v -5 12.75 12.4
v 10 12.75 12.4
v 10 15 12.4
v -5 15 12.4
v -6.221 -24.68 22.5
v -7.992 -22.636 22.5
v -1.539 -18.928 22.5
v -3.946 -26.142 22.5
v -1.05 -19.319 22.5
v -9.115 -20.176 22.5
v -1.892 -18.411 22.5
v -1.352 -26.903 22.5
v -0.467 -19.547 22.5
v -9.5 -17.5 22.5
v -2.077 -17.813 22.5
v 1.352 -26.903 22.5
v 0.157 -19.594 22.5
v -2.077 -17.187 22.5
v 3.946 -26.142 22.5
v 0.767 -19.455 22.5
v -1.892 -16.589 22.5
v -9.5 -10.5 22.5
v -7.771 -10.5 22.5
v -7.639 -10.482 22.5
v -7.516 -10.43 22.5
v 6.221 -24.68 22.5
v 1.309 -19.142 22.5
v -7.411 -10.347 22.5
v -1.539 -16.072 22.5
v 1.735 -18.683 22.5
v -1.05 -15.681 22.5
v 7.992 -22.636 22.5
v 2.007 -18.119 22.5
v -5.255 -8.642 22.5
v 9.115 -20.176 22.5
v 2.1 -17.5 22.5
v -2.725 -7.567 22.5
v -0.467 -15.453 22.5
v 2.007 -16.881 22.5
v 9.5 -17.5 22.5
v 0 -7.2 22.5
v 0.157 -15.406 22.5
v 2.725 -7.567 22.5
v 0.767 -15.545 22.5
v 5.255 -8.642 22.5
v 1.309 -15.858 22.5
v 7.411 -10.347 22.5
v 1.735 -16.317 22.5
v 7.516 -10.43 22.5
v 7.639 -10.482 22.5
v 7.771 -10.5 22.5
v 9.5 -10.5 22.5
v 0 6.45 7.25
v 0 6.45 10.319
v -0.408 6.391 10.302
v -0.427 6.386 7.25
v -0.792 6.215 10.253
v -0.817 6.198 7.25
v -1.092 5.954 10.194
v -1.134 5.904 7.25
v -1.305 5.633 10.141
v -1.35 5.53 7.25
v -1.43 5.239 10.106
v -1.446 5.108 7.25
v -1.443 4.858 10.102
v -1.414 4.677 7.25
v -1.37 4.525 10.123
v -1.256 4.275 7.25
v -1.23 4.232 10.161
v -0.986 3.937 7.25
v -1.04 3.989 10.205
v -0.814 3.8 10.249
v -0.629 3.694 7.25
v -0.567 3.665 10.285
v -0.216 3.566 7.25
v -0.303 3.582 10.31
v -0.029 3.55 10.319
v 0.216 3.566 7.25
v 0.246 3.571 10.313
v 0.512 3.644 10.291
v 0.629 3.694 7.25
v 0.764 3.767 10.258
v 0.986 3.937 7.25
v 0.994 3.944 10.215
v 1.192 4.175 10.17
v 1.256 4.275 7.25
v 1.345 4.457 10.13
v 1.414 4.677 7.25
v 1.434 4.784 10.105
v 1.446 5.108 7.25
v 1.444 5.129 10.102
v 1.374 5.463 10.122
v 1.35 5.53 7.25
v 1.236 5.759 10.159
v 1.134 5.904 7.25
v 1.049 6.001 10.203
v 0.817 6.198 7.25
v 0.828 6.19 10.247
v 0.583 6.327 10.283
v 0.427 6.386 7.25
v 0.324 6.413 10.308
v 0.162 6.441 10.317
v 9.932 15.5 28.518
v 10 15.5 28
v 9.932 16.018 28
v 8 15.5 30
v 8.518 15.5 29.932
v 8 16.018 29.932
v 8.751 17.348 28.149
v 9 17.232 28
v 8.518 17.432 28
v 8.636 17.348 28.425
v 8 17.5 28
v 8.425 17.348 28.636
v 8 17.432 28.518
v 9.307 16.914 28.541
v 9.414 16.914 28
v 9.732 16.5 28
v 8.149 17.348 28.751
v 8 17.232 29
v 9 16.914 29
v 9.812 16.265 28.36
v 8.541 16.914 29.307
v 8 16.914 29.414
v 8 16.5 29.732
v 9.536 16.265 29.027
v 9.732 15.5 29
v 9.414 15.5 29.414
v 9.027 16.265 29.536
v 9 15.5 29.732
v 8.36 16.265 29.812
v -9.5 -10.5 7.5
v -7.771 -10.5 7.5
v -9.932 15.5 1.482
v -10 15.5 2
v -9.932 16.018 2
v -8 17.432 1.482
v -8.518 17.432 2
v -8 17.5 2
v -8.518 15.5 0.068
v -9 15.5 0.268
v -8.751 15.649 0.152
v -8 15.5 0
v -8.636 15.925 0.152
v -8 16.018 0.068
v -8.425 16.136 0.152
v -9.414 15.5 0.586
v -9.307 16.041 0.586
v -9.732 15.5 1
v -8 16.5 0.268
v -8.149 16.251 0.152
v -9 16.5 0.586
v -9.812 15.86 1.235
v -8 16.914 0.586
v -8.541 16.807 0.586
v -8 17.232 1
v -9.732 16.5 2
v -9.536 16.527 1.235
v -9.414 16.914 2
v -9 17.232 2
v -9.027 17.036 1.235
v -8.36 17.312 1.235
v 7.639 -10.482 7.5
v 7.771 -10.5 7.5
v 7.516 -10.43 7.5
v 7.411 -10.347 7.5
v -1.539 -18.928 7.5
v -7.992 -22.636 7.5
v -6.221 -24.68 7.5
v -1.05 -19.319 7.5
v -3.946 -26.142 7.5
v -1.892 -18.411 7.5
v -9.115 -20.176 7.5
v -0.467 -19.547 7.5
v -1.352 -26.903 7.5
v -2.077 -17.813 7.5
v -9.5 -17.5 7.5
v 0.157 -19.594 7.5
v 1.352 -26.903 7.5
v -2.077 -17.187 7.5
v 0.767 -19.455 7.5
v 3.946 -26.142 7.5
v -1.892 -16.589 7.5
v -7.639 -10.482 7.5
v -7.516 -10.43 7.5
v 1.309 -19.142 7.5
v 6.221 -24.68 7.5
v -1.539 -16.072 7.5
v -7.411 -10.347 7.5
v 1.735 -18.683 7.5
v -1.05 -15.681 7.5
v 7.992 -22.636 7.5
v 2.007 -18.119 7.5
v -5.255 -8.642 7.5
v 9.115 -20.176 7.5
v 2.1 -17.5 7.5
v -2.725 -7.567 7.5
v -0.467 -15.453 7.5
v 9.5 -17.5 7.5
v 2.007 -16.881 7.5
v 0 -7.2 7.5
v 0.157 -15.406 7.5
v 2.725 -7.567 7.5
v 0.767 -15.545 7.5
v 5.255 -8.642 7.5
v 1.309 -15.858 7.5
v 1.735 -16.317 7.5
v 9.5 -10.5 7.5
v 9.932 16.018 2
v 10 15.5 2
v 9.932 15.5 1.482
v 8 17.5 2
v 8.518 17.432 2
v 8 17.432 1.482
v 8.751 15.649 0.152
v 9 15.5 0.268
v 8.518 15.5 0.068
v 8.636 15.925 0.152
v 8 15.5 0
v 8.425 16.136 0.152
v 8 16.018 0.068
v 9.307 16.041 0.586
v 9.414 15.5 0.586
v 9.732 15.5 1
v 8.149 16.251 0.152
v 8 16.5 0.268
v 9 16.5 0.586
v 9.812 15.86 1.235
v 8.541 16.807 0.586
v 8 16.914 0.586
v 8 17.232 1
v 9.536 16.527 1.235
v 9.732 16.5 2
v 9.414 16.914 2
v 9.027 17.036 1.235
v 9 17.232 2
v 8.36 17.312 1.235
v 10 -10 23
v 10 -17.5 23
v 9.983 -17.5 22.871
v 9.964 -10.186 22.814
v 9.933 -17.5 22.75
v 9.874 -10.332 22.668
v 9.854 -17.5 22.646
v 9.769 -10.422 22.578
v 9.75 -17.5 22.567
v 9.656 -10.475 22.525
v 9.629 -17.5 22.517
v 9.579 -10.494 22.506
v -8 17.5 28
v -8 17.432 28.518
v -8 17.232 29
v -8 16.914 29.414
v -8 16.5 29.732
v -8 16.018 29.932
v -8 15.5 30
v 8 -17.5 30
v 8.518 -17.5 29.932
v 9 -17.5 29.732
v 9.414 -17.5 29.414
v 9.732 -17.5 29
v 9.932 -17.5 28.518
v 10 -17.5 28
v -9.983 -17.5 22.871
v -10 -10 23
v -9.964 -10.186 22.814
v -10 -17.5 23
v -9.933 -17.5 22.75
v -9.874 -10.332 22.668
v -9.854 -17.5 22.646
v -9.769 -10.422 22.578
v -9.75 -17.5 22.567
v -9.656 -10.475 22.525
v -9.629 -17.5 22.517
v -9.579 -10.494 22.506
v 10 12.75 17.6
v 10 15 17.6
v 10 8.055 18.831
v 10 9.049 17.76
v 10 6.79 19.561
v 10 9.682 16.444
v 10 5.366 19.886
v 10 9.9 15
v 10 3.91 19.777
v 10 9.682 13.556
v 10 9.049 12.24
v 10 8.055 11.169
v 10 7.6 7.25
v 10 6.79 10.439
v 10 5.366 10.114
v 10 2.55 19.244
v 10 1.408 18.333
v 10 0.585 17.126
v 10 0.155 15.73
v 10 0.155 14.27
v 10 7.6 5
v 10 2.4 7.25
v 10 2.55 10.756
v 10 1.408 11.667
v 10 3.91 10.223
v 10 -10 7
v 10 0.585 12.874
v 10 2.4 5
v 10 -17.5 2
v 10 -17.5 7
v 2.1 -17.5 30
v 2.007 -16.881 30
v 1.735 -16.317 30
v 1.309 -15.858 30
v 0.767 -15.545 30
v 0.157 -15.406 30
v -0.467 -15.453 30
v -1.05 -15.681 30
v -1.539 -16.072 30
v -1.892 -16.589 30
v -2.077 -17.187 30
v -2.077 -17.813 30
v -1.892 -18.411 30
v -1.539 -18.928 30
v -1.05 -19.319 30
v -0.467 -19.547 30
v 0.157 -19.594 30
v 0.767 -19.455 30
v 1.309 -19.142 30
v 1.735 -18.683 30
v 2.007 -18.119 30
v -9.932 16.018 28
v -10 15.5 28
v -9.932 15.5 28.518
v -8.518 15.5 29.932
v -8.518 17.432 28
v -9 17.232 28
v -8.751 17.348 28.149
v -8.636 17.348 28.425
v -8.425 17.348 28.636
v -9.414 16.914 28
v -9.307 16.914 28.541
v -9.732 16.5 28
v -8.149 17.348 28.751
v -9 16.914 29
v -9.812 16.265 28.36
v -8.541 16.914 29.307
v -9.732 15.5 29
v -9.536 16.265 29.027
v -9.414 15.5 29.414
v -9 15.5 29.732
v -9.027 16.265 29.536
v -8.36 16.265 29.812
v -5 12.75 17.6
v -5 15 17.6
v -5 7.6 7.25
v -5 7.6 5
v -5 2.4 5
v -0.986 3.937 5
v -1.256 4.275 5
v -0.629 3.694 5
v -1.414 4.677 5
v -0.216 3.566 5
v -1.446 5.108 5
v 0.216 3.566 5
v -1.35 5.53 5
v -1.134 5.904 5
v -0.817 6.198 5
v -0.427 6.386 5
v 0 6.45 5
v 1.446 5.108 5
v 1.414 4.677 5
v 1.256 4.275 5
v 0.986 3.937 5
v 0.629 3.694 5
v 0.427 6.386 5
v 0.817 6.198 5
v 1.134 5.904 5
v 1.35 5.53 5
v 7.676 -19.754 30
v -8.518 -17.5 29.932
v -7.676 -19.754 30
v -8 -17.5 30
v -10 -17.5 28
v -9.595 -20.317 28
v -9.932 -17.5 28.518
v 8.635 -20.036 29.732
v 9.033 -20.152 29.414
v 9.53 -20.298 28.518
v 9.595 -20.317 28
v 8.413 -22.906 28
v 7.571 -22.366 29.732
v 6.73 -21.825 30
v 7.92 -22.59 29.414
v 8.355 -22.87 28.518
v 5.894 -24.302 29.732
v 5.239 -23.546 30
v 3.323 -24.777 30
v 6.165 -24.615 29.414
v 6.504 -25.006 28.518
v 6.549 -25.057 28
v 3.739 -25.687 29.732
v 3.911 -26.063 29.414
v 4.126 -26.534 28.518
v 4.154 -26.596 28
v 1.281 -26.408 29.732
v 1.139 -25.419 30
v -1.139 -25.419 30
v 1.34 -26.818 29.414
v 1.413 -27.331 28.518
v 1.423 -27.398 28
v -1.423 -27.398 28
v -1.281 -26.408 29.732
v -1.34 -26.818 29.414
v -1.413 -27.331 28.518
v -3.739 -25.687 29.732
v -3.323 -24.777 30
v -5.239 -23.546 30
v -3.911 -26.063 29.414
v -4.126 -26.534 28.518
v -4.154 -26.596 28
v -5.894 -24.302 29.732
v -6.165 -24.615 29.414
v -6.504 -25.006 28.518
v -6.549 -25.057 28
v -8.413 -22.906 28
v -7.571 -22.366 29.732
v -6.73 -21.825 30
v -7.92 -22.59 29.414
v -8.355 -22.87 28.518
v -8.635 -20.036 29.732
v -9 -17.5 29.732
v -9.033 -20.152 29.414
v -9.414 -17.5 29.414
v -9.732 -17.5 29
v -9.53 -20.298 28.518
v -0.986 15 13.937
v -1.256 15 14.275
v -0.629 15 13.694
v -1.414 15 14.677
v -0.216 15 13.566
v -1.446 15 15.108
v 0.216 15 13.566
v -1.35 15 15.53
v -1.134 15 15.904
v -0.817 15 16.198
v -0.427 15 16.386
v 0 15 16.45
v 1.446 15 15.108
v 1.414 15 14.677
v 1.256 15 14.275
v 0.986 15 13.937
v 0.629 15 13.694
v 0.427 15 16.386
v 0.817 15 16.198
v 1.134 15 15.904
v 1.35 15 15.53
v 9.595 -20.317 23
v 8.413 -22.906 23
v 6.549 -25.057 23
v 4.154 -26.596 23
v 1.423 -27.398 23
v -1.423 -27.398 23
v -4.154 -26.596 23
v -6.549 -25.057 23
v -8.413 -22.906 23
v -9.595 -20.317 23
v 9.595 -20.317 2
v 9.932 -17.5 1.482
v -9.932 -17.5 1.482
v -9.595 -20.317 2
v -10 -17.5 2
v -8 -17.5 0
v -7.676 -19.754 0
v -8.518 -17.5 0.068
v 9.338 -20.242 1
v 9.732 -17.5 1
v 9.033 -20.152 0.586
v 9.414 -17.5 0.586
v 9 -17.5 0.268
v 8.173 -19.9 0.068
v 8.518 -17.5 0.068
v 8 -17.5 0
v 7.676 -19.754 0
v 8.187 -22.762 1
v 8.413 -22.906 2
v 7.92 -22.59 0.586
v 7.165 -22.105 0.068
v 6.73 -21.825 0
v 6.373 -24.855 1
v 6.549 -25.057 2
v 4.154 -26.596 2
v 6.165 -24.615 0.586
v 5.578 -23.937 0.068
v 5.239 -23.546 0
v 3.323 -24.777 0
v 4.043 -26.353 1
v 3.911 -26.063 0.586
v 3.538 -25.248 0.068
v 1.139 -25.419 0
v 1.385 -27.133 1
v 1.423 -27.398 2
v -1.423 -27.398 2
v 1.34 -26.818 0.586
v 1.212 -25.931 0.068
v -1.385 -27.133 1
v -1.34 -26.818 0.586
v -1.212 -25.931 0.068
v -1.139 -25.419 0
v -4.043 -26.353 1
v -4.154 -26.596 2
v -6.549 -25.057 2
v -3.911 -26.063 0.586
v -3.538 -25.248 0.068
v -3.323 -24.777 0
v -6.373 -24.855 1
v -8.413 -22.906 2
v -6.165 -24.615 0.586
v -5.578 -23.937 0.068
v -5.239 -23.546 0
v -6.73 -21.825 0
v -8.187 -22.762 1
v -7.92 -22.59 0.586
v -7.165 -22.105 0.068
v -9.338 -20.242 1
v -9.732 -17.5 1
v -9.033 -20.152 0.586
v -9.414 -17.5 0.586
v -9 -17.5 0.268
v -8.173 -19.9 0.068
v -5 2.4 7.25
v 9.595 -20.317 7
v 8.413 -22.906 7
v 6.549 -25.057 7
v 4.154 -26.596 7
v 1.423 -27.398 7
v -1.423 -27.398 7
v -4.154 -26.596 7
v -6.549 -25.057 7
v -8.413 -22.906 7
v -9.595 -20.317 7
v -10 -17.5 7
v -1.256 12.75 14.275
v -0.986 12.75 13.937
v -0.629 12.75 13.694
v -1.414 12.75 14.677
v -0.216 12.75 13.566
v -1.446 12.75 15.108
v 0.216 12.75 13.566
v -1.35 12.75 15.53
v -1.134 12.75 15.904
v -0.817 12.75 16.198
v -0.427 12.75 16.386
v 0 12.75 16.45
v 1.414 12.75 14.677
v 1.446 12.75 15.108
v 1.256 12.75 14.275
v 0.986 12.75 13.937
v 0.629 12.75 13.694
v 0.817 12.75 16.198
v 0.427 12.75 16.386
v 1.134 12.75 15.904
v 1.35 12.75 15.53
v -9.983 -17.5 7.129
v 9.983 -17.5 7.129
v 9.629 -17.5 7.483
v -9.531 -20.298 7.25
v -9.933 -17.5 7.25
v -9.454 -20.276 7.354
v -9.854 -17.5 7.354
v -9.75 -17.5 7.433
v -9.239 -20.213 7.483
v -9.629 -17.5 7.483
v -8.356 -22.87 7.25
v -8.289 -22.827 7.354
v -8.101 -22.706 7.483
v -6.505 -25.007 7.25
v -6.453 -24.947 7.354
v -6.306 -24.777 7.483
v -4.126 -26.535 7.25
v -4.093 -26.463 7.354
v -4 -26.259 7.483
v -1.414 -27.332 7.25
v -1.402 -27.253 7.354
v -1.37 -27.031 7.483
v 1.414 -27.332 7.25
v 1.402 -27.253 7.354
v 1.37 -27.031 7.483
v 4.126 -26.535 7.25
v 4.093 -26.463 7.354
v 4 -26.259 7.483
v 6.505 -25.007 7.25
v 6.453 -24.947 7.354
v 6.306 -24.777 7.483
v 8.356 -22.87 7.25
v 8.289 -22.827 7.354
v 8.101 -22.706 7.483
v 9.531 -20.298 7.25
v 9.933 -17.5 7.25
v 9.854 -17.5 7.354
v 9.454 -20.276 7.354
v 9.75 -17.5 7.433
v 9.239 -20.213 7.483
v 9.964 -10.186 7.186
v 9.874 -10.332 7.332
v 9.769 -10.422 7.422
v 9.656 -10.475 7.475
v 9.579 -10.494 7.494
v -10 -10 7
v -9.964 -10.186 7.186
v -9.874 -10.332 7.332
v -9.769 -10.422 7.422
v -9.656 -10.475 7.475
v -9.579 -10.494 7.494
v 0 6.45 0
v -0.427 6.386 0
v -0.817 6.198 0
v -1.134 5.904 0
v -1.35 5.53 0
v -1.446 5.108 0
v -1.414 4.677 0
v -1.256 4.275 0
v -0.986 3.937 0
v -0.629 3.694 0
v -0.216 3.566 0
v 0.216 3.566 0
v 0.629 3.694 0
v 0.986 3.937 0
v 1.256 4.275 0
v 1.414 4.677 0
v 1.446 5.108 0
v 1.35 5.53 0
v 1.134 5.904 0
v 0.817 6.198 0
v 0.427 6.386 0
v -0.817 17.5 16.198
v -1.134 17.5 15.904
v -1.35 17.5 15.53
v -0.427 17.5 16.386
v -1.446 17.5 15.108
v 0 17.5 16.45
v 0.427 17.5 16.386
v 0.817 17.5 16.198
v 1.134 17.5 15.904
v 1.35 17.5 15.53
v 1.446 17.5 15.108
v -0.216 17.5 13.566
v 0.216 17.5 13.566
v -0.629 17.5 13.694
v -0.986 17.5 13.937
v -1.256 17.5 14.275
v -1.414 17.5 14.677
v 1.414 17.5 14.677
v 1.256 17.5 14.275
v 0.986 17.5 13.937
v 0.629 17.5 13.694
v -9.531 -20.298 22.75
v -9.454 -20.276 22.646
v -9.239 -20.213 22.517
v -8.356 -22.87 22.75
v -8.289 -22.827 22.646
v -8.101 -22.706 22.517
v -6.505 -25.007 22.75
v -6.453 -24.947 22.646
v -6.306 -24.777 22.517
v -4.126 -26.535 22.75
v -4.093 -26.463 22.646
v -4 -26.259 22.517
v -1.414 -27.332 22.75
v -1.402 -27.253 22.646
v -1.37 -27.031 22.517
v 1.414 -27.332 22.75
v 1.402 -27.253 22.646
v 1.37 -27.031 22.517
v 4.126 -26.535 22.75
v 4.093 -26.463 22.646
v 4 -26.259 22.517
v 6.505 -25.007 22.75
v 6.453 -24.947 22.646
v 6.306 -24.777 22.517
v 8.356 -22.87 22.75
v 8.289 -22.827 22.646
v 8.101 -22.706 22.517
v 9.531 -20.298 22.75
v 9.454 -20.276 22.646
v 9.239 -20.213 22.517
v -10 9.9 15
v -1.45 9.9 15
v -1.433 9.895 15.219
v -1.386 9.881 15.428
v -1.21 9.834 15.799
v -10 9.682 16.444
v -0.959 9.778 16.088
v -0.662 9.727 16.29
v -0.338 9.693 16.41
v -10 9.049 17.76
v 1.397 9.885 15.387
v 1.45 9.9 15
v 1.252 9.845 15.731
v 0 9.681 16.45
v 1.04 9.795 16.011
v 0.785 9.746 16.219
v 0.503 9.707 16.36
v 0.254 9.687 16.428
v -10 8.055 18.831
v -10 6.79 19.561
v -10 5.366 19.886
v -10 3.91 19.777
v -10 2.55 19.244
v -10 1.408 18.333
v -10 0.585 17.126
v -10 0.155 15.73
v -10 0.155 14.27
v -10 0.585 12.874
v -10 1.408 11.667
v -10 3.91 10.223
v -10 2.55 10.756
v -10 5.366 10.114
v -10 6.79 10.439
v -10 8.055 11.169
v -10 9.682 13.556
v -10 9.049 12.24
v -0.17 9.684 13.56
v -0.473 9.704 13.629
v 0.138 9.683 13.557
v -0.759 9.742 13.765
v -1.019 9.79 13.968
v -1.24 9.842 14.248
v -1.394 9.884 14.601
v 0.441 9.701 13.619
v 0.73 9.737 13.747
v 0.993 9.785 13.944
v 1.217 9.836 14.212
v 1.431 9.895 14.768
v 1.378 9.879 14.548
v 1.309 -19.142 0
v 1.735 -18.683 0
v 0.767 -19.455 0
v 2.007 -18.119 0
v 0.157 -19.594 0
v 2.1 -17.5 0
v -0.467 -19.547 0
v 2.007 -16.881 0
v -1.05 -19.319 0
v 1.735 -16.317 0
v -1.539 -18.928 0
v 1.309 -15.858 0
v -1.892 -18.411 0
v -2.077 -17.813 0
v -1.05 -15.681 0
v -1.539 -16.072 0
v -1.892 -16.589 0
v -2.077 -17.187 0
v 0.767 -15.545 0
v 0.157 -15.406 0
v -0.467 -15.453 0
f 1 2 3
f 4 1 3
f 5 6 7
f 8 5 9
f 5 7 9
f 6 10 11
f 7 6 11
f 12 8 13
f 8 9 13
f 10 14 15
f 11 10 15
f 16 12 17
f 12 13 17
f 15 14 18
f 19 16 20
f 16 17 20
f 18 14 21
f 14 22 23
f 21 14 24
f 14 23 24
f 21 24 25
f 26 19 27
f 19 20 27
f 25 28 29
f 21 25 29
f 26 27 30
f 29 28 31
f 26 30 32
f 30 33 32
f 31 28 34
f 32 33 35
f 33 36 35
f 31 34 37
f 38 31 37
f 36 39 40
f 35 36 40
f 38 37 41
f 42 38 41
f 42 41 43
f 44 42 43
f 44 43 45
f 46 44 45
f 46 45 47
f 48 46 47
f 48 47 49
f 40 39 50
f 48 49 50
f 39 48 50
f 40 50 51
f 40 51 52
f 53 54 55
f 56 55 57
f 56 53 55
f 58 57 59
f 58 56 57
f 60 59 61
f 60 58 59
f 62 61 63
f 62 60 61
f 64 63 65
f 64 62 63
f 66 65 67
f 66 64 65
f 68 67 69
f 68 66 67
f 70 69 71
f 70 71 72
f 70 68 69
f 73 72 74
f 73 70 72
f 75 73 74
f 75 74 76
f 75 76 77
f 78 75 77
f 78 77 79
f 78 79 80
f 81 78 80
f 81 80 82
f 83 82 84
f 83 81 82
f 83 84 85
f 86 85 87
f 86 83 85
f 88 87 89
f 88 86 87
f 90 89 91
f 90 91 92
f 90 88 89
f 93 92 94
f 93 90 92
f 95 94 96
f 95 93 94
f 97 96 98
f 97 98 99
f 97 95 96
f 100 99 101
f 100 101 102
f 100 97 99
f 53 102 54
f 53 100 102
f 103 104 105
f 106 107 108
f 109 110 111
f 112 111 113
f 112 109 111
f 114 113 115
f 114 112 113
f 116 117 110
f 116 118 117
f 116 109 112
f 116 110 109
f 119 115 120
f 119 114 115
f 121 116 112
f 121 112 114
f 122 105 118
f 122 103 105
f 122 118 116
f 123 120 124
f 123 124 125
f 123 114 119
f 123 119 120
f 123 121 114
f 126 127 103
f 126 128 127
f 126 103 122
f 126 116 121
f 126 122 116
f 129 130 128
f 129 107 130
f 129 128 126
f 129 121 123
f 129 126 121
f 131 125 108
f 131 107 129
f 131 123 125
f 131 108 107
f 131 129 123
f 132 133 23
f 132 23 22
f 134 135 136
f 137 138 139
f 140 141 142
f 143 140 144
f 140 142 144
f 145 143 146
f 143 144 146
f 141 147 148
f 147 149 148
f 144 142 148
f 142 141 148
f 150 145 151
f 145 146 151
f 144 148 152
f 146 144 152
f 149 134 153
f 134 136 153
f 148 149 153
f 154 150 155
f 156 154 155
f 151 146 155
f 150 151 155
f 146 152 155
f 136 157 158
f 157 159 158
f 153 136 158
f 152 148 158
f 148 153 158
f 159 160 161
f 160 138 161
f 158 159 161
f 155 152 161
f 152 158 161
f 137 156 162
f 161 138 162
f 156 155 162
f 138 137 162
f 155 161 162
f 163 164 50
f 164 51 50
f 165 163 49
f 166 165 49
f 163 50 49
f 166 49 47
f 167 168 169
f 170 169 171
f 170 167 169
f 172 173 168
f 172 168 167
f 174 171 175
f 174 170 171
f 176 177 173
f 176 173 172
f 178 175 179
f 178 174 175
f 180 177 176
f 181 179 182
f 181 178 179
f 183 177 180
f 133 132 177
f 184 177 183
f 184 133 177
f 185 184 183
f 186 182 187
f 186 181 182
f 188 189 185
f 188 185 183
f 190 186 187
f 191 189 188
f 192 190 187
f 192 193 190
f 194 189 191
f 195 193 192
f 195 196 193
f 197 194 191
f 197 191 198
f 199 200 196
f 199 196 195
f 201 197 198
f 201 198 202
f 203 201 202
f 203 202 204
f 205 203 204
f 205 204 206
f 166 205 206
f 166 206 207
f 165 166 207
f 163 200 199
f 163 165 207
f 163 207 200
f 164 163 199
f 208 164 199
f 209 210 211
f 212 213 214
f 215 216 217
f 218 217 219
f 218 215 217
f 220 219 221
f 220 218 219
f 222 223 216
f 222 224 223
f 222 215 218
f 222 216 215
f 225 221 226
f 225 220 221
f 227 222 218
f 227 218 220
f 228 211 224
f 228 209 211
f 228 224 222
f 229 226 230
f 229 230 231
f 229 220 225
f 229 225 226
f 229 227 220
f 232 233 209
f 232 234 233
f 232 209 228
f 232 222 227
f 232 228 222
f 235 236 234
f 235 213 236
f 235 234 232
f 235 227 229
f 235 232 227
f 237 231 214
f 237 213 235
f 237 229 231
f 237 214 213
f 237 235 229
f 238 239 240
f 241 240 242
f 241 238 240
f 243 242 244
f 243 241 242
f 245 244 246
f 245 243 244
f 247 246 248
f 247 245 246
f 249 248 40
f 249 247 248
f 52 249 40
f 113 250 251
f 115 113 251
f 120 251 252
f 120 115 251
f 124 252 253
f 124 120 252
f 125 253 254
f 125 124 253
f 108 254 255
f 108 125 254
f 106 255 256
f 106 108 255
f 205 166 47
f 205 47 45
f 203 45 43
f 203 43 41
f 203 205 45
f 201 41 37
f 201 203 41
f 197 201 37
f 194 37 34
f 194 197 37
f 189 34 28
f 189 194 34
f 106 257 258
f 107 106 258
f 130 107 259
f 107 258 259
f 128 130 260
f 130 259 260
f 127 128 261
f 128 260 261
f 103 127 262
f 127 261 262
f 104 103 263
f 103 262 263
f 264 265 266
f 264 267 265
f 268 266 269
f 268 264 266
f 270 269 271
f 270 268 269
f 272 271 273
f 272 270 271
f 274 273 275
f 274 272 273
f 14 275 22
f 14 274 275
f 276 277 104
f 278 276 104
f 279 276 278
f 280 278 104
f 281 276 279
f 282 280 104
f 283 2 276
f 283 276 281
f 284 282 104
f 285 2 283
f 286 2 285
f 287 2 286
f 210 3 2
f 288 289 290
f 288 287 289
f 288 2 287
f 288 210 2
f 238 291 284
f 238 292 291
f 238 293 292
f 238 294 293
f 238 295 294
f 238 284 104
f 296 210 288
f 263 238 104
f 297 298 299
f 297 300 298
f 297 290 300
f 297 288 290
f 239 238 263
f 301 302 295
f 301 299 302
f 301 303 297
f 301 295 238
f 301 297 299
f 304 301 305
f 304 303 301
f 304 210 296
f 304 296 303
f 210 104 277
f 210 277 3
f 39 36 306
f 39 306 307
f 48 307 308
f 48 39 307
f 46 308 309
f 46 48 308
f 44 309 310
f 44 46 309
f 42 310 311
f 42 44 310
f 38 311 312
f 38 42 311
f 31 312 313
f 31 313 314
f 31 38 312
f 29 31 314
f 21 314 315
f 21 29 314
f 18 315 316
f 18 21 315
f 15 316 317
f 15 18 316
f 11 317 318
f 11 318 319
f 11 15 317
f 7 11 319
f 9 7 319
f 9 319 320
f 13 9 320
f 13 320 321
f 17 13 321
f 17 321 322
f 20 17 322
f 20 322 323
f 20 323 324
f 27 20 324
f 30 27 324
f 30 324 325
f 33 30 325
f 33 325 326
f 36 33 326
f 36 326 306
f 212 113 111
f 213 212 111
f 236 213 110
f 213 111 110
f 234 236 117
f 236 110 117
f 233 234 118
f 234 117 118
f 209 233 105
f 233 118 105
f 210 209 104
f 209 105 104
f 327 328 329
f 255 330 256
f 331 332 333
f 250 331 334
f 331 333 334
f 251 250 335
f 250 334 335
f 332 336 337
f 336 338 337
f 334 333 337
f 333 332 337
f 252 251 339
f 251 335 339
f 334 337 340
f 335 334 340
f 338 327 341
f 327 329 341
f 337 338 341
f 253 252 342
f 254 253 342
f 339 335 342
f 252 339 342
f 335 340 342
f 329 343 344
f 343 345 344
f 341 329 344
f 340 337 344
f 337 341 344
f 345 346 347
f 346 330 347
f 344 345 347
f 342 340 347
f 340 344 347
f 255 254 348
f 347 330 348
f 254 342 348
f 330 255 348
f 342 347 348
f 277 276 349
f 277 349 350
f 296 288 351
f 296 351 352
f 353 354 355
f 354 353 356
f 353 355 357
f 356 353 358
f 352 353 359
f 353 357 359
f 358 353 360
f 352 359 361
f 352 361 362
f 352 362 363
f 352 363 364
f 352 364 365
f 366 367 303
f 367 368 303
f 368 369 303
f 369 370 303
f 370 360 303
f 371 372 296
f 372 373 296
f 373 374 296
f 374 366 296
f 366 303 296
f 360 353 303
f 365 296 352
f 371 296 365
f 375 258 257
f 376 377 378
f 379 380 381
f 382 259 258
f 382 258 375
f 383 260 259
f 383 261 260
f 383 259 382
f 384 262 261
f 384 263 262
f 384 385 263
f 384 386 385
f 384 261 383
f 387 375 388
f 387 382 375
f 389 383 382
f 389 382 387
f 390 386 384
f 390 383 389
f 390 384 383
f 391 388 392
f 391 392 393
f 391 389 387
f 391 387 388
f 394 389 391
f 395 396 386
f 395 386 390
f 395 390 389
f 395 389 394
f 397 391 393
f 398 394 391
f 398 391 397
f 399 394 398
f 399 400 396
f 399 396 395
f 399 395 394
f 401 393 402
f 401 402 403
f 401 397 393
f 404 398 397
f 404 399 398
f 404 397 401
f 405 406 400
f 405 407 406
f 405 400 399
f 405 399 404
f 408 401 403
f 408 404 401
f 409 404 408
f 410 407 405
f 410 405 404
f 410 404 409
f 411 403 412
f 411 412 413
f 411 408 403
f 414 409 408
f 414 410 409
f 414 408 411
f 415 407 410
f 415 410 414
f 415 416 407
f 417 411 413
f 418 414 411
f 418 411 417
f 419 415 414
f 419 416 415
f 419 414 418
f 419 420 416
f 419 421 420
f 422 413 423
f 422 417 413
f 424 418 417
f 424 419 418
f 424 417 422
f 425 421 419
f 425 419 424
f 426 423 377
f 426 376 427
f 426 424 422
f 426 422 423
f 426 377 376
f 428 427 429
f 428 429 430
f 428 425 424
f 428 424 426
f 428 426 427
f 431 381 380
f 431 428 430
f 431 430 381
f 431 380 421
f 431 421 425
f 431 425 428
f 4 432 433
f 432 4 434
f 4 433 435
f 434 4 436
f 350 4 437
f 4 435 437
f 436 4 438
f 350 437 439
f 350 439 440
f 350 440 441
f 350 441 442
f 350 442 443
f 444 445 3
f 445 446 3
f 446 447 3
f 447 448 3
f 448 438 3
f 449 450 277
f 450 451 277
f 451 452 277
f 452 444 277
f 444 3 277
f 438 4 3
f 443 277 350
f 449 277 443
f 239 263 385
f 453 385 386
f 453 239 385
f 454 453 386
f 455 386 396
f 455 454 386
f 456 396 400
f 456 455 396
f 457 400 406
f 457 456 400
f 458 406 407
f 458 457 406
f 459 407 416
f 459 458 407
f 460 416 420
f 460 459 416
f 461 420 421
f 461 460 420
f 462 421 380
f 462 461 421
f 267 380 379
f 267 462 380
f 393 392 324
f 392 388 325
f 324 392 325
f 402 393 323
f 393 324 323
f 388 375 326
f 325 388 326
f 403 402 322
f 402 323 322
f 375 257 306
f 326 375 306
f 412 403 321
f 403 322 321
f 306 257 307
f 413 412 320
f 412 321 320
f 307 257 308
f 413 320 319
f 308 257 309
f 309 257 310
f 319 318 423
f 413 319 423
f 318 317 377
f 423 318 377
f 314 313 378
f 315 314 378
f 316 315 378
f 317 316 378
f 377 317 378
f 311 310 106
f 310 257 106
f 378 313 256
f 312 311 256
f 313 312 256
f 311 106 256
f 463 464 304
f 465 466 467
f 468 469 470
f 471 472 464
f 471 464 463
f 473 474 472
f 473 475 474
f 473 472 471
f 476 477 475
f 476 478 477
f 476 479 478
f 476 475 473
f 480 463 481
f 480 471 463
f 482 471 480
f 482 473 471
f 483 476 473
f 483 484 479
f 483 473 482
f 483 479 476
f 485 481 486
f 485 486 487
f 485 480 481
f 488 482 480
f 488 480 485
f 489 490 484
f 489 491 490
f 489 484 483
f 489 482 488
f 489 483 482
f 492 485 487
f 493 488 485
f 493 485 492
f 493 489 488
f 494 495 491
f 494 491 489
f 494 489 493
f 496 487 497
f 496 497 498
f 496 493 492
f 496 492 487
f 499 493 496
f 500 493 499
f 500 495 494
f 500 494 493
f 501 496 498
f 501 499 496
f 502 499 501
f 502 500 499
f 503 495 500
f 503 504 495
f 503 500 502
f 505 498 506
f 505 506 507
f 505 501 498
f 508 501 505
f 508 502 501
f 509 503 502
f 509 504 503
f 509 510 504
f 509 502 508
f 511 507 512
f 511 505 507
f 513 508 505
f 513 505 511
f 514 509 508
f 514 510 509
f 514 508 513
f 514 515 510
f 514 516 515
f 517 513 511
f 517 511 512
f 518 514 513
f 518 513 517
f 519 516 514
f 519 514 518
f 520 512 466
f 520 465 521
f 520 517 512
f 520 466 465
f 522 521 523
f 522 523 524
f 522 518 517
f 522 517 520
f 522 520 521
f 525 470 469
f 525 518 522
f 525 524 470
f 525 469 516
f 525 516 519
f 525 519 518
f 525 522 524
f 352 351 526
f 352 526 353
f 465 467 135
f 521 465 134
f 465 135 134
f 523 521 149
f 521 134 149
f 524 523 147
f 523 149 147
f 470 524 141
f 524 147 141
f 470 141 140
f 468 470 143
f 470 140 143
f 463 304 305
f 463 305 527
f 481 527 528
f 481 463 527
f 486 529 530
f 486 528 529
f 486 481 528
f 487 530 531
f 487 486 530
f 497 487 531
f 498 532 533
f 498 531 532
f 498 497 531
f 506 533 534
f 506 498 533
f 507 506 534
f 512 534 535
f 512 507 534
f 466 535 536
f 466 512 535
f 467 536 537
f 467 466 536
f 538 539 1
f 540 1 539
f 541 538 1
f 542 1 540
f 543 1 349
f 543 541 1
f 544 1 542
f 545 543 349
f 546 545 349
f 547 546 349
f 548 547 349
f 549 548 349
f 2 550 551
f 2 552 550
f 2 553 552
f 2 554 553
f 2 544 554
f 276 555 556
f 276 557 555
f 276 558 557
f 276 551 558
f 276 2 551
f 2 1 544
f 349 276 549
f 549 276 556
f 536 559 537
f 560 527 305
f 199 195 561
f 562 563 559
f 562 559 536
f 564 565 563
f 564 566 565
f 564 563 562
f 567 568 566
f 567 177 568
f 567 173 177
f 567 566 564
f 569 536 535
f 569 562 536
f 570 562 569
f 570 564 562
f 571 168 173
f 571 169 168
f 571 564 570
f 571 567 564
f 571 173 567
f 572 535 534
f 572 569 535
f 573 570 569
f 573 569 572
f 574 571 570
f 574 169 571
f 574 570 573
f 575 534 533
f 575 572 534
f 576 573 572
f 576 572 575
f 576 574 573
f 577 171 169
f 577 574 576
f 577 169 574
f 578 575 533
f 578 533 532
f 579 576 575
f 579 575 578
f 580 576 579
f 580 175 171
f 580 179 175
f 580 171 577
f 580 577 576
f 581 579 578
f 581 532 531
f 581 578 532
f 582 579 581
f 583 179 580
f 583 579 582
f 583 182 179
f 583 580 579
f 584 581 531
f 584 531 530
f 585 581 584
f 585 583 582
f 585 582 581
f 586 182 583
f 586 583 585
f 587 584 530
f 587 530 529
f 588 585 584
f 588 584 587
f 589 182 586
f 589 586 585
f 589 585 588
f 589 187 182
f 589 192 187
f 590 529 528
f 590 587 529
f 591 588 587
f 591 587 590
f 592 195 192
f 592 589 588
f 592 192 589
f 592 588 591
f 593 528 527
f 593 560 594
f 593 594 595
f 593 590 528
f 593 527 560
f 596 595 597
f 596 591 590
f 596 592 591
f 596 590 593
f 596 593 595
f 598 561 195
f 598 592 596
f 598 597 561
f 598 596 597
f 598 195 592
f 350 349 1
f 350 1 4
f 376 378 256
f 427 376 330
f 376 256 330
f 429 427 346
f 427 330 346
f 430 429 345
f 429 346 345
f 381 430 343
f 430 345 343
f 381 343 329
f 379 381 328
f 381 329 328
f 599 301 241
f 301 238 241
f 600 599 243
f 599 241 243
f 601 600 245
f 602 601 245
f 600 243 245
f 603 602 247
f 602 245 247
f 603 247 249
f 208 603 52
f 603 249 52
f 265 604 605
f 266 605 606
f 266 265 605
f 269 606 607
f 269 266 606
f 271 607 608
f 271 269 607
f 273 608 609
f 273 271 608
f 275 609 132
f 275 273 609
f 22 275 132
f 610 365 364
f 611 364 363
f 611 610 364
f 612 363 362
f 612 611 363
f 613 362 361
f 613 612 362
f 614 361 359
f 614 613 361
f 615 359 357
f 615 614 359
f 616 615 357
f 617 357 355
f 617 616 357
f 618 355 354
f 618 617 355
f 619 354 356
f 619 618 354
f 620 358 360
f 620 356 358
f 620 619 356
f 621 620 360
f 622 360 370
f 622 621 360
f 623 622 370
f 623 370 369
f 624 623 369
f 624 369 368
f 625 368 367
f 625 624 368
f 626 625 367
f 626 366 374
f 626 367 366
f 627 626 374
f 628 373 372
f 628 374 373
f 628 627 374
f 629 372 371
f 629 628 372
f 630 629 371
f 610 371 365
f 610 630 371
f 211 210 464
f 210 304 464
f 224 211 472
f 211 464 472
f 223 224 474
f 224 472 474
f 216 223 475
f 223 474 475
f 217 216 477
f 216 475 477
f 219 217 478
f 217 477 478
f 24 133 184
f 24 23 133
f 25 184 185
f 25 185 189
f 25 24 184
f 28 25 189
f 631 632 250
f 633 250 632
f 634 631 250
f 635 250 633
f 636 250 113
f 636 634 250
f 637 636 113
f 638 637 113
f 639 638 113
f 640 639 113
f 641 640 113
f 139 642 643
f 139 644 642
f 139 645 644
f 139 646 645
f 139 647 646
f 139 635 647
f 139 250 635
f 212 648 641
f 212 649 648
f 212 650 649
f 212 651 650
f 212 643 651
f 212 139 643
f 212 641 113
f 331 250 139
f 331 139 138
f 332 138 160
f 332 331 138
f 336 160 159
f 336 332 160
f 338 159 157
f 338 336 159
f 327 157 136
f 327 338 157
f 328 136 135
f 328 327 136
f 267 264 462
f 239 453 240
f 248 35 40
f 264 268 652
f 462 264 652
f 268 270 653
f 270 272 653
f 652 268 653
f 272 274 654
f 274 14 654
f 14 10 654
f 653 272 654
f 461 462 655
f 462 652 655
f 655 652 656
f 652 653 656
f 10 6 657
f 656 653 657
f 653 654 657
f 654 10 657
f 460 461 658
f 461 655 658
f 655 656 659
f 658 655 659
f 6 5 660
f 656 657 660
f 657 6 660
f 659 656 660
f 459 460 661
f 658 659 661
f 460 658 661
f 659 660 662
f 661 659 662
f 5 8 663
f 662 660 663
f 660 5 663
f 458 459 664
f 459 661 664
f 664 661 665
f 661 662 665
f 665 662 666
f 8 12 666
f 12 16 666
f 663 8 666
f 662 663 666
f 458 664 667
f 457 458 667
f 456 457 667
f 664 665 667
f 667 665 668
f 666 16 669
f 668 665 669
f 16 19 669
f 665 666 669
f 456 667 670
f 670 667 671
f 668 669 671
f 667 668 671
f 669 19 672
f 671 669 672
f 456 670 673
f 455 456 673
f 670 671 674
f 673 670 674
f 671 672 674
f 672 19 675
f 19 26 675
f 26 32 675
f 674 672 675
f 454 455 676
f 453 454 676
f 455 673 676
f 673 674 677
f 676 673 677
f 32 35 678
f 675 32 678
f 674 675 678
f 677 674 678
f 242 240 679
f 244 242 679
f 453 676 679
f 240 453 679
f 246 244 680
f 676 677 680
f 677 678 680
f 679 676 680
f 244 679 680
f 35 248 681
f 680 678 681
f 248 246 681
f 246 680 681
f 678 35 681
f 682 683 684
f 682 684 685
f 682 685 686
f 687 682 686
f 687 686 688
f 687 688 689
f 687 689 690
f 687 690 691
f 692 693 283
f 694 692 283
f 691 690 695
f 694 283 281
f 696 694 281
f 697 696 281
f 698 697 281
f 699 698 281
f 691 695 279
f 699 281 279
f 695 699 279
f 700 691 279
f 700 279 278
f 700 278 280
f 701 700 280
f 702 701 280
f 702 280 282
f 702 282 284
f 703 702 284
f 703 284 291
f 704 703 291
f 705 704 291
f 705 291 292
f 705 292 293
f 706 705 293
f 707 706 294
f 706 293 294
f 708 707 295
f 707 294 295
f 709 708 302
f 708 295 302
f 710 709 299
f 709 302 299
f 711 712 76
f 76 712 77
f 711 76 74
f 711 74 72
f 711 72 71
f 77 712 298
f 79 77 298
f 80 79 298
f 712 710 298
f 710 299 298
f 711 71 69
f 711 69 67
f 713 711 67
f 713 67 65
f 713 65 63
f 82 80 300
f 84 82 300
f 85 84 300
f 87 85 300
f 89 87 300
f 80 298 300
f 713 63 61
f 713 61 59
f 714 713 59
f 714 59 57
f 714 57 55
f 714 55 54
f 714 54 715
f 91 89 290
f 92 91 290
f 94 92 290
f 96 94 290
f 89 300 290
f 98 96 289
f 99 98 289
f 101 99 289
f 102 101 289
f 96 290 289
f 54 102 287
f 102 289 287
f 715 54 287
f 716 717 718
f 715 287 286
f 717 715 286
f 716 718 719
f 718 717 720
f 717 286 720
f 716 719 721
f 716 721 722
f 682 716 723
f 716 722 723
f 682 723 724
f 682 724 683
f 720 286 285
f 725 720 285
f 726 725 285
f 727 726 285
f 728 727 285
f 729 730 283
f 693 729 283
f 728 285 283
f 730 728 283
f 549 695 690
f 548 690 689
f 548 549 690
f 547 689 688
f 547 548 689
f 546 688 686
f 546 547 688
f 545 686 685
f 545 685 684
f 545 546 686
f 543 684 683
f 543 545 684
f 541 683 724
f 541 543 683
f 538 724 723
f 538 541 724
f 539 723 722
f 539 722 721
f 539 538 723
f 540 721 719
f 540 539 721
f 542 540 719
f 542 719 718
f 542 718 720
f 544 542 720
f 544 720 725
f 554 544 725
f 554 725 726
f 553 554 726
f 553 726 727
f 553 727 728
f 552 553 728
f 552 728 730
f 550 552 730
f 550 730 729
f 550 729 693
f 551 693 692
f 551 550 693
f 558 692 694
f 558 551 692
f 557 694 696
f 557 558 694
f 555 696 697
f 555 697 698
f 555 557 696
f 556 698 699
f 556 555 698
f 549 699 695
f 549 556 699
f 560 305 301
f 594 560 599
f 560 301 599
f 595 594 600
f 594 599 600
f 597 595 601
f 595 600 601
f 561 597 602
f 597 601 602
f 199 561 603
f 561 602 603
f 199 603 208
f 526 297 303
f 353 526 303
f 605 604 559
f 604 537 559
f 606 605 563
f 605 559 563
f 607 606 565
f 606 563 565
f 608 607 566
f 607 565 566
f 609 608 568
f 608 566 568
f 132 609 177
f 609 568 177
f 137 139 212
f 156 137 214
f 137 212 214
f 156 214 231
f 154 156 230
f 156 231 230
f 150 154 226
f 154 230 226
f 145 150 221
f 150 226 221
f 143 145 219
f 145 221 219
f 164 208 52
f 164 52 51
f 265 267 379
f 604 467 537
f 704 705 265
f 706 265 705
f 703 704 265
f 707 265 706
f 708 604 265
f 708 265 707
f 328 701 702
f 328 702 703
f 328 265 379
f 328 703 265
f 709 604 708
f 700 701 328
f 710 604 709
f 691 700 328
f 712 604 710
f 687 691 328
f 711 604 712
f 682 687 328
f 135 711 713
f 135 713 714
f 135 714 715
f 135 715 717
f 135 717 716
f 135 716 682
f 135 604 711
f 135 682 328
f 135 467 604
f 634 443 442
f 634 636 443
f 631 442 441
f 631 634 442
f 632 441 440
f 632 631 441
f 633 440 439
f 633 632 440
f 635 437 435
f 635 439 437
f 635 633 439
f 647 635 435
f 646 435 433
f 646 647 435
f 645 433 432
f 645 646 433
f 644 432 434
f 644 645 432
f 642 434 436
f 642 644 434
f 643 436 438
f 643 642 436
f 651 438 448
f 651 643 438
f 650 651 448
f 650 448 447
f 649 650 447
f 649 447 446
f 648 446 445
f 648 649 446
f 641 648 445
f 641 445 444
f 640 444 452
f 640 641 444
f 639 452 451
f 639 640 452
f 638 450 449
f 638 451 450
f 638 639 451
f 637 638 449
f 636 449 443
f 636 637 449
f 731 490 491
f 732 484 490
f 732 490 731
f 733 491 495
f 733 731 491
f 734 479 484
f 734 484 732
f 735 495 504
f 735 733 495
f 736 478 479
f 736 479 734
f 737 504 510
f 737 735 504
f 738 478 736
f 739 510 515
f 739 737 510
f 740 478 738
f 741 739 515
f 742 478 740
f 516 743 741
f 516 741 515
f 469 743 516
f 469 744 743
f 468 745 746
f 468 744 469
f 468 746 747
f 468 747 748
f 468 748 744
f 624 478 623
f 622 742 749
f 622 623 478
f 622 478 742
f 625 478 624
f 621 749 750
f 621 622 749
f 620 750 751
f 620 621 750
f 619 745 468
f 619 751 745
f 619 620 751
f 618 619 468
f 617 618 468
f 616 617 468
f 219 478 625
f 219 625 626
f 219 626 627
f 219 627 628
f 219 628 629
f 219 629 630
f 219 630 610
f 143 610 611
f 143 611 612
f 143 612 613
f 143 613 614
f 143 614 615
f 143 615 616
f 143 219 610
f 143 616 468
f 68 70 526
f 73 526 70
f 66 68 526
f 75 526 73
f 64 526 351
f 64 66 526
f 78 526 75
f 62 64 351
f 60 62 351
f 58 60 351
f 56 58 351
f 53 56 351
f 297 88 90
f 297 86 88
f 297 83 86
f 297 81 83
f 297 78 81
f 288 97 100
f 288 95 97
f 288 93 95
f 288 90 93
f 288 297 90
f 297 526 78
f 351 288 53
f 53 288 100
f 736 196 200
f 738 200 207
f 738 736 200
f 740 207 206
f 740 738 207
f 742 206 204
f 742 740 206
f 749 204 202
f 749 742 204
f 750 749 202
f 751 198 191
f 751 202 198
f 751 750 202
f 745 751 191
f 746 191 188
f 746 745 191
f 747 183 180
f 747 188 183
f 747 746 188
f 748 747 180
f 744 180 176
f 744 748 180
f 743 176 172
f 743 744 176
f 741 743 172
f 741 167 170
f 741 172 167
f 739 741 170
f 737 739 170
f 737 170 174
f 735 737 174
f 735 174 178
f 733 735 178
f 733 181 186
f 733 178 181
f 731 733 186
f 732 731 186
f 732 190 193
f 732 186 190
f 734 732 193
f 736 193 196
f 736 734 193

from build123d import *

# Parameters (mm, degrees)
ESQUISSE1_R                  = 2.1
BOSS_EXTRU_1_DEPTH           = 30
ENL_V_MAT_EXTRU_1_DEPTH      = 7.5
ENL_V_MAT_EXTRU_1_DEPTH_BACK = 7.5
ENL_V_MAT_EXTRU_2_REACH      = 47.346
ESQUISSE3_R                  = 4.9
ESQUISSE5_W                  = 2.25
ESQUISSE5_H                  = 5.2
ENL_V_MAT_EXTRU_3_DEPTH      = 15
R_P_TITION_CIRCULAIRE1_COUNT = 2
R_P_TITION_CIRCULAIRE1_ANGLE = 90
CONG_1_R                     = 2
CONG_2_R                     = 0.5


with BuildPart() as part:
    # Esquisse1 → Boss.-Extru.1 (new body)
    with BuildSketch(Plane.XY):
        with BuildLine():
            Line((-10, 17.5), (10, 17.5))
            Line((10, 17.5), (10, -17.5))
            ThreePointArc((10, -17.5), (0, -27.5), (-10, -17.5))
            Line((-10, -17.5), (-10, 17.5))
        make_face()
        with Locations((0, -17.5)):
            Circle(ESQUISSE1_R, mode=Mode.SUBTRACT)
    extrude(amount=BOSS_EXTRU_1_DEPTH)

    # Esquisse2 → Enlèv. mat.-Extru.1 (cut, two sides: drawn at the far end of the back side and taken through both)
    with BuildSketch(Plane.XY.offset(15).offset(-ENL_V_MAT_EXTRU_1_DEPTH_BACK)):
        with BuildLine():
            Line((-7.55579248, -10.5), (-10, -10.5))
            Line((-10, -10.5), (-10, -17.5))
            ThreePointArc((-10, -17.5), (0, -27.5), (10, -17.5))
            Line((10, -17.5), (10, -10.5))
            Line((10, -10.5), (7.55579248, -10.5))
            ThreePointArc((7.55579248, -10.5), (0, -7.2), (-7.55579248, -10.5))
        make_face()
    extrude(amount=ENL_V_MAT_EXTRU_1_DEPTH + ENL_V_MAT_EXTRU_1_DEPTH_BACK, mode=Mode.SUBTRACT)

    # Esquisse3 → Enlèv. mat.-Extru.2 (cut, up to next)
    with BuildSketch(Plane(origin=(10, 0, 0), x_dir=(0, 0, -1), z_dir=(1, 0, 0)), mode=Mode.PRIVATE) as enl_v_mat_extru_2_sk1:
        with Locations(Location((-15, 5, 0), (0, 0, 90))):
            Circle(ESQUISSE3_R)
    enl_v_mat_extru_2_tool1 = extrude(enl_v_mat_extru_2_sk1.sketch, amount=-ENL_V_MAT_EXTRU_2_REACH, mode=Mode.PRIVATE) & part.part
    add(enl_v_mat_extru_2_tool1.solids().sort_by_distance((10, 5, 15))[0], mode=Mode.SUBTRACT)

    # Esquisse5 → Enlèv. mat.-Extru.3 (cut)
    with BuildSketch(Plane(origin=(10, -72.478135826, -1.639734987), x_dir=(0, 0, -1), z_dir=(1, 0, 0))):
        with Locations((-7.764734987, 77.478135826)):
            Rectangle(ESQUISSE5_W, ESQUISSE5_H)
    enl_v_mat_extru_3 = extrude(amount=-ENL_V_MAT_EXTRU_3_DEPTH, mode=Mode.SUBTRACT)

    # Esquisse11 → Dégagement M2.52 (revolve, cut)
    with BuildSketch(Plane(origin=(0, 5, 0), x_dir=(0, 1, 0), z_dir=(1, 0, 0))):
        Polygon((0, 0), (0, 15.870247898), (1.45, 14.999), (1.45, 0), align=None)
    d_gagement_m2_52 = revolve(axis=Axis((0, 5, -6.35), (0, 0, 1)), mode=Mode.SUBTRACT)

    # Répétition circulaire1: Enlèv. mat.-Extru.3, Dégagement M2.52 ×2 about axis
    r_p_tition_circulaire1_axis = Axis((0, 5, 15), (1, 0, 0))
    add([enl_v_mat_extru_3.rotate(r_p_tition_circulaire1_axis, i * R_P_TITION_CIRCULAIRE1_ANGLE / (R_P_TITION_CIRCULAIRE1_COUNT - 1)) for i in range(1, R_P_TITION_CIRCULAIRE1_COUNT)], mode=Mode.SUBTRACT)
    add([d_gagement_m2_52.rotate(r_p_tition_circulaire1_axis, i * R_P_TITION_CIRCULAIRE1_ANGLE / (R_P_TITION_CIRCULAIRE1_COUNT - 1)) for i in range(1, R_P_TITION_CIRCULAIRE1_COUNT)], mode=Mode.SUBTRACT)

    # Congé1
    cong_1_edges = [part.edges().sort_by_distance(p)[0] for p in [
        (10, 0, 30),
        (-10, 17.5, 15),
        (10, 17.5, 15),
        (0, 17.5, 30),
        (-10, 0, 30),
        (0, -27.5, 30),
        (-10, 0, 0),
        (0, 17.5, 0),
        (10, 0, 0),
        (0, -27.5, 0),
    ]]
    fillet(cong_1_edges, radius=CONG_1_R)

    # Congé2
    cong_2_edges = [part.edges().sort_by_distance(p)[0] for p in [
        (7.55579248, -10.5, 15),
        (-7.55579248, -10.5, 15),
        (-10, -10.5, 15),
        (-10, -14, 7.5),
        (0, -27.5, 7.5),
        (10, -14, 7.5),
        (10, -10.5, 15),
        (-10, -14, 22.5),
        (0, -27.5, 22.5),
        (10, -14, 22.5),
    ]]
    fillet(cong_2_edges, radius=CONG_2_R)


solid = part.part
